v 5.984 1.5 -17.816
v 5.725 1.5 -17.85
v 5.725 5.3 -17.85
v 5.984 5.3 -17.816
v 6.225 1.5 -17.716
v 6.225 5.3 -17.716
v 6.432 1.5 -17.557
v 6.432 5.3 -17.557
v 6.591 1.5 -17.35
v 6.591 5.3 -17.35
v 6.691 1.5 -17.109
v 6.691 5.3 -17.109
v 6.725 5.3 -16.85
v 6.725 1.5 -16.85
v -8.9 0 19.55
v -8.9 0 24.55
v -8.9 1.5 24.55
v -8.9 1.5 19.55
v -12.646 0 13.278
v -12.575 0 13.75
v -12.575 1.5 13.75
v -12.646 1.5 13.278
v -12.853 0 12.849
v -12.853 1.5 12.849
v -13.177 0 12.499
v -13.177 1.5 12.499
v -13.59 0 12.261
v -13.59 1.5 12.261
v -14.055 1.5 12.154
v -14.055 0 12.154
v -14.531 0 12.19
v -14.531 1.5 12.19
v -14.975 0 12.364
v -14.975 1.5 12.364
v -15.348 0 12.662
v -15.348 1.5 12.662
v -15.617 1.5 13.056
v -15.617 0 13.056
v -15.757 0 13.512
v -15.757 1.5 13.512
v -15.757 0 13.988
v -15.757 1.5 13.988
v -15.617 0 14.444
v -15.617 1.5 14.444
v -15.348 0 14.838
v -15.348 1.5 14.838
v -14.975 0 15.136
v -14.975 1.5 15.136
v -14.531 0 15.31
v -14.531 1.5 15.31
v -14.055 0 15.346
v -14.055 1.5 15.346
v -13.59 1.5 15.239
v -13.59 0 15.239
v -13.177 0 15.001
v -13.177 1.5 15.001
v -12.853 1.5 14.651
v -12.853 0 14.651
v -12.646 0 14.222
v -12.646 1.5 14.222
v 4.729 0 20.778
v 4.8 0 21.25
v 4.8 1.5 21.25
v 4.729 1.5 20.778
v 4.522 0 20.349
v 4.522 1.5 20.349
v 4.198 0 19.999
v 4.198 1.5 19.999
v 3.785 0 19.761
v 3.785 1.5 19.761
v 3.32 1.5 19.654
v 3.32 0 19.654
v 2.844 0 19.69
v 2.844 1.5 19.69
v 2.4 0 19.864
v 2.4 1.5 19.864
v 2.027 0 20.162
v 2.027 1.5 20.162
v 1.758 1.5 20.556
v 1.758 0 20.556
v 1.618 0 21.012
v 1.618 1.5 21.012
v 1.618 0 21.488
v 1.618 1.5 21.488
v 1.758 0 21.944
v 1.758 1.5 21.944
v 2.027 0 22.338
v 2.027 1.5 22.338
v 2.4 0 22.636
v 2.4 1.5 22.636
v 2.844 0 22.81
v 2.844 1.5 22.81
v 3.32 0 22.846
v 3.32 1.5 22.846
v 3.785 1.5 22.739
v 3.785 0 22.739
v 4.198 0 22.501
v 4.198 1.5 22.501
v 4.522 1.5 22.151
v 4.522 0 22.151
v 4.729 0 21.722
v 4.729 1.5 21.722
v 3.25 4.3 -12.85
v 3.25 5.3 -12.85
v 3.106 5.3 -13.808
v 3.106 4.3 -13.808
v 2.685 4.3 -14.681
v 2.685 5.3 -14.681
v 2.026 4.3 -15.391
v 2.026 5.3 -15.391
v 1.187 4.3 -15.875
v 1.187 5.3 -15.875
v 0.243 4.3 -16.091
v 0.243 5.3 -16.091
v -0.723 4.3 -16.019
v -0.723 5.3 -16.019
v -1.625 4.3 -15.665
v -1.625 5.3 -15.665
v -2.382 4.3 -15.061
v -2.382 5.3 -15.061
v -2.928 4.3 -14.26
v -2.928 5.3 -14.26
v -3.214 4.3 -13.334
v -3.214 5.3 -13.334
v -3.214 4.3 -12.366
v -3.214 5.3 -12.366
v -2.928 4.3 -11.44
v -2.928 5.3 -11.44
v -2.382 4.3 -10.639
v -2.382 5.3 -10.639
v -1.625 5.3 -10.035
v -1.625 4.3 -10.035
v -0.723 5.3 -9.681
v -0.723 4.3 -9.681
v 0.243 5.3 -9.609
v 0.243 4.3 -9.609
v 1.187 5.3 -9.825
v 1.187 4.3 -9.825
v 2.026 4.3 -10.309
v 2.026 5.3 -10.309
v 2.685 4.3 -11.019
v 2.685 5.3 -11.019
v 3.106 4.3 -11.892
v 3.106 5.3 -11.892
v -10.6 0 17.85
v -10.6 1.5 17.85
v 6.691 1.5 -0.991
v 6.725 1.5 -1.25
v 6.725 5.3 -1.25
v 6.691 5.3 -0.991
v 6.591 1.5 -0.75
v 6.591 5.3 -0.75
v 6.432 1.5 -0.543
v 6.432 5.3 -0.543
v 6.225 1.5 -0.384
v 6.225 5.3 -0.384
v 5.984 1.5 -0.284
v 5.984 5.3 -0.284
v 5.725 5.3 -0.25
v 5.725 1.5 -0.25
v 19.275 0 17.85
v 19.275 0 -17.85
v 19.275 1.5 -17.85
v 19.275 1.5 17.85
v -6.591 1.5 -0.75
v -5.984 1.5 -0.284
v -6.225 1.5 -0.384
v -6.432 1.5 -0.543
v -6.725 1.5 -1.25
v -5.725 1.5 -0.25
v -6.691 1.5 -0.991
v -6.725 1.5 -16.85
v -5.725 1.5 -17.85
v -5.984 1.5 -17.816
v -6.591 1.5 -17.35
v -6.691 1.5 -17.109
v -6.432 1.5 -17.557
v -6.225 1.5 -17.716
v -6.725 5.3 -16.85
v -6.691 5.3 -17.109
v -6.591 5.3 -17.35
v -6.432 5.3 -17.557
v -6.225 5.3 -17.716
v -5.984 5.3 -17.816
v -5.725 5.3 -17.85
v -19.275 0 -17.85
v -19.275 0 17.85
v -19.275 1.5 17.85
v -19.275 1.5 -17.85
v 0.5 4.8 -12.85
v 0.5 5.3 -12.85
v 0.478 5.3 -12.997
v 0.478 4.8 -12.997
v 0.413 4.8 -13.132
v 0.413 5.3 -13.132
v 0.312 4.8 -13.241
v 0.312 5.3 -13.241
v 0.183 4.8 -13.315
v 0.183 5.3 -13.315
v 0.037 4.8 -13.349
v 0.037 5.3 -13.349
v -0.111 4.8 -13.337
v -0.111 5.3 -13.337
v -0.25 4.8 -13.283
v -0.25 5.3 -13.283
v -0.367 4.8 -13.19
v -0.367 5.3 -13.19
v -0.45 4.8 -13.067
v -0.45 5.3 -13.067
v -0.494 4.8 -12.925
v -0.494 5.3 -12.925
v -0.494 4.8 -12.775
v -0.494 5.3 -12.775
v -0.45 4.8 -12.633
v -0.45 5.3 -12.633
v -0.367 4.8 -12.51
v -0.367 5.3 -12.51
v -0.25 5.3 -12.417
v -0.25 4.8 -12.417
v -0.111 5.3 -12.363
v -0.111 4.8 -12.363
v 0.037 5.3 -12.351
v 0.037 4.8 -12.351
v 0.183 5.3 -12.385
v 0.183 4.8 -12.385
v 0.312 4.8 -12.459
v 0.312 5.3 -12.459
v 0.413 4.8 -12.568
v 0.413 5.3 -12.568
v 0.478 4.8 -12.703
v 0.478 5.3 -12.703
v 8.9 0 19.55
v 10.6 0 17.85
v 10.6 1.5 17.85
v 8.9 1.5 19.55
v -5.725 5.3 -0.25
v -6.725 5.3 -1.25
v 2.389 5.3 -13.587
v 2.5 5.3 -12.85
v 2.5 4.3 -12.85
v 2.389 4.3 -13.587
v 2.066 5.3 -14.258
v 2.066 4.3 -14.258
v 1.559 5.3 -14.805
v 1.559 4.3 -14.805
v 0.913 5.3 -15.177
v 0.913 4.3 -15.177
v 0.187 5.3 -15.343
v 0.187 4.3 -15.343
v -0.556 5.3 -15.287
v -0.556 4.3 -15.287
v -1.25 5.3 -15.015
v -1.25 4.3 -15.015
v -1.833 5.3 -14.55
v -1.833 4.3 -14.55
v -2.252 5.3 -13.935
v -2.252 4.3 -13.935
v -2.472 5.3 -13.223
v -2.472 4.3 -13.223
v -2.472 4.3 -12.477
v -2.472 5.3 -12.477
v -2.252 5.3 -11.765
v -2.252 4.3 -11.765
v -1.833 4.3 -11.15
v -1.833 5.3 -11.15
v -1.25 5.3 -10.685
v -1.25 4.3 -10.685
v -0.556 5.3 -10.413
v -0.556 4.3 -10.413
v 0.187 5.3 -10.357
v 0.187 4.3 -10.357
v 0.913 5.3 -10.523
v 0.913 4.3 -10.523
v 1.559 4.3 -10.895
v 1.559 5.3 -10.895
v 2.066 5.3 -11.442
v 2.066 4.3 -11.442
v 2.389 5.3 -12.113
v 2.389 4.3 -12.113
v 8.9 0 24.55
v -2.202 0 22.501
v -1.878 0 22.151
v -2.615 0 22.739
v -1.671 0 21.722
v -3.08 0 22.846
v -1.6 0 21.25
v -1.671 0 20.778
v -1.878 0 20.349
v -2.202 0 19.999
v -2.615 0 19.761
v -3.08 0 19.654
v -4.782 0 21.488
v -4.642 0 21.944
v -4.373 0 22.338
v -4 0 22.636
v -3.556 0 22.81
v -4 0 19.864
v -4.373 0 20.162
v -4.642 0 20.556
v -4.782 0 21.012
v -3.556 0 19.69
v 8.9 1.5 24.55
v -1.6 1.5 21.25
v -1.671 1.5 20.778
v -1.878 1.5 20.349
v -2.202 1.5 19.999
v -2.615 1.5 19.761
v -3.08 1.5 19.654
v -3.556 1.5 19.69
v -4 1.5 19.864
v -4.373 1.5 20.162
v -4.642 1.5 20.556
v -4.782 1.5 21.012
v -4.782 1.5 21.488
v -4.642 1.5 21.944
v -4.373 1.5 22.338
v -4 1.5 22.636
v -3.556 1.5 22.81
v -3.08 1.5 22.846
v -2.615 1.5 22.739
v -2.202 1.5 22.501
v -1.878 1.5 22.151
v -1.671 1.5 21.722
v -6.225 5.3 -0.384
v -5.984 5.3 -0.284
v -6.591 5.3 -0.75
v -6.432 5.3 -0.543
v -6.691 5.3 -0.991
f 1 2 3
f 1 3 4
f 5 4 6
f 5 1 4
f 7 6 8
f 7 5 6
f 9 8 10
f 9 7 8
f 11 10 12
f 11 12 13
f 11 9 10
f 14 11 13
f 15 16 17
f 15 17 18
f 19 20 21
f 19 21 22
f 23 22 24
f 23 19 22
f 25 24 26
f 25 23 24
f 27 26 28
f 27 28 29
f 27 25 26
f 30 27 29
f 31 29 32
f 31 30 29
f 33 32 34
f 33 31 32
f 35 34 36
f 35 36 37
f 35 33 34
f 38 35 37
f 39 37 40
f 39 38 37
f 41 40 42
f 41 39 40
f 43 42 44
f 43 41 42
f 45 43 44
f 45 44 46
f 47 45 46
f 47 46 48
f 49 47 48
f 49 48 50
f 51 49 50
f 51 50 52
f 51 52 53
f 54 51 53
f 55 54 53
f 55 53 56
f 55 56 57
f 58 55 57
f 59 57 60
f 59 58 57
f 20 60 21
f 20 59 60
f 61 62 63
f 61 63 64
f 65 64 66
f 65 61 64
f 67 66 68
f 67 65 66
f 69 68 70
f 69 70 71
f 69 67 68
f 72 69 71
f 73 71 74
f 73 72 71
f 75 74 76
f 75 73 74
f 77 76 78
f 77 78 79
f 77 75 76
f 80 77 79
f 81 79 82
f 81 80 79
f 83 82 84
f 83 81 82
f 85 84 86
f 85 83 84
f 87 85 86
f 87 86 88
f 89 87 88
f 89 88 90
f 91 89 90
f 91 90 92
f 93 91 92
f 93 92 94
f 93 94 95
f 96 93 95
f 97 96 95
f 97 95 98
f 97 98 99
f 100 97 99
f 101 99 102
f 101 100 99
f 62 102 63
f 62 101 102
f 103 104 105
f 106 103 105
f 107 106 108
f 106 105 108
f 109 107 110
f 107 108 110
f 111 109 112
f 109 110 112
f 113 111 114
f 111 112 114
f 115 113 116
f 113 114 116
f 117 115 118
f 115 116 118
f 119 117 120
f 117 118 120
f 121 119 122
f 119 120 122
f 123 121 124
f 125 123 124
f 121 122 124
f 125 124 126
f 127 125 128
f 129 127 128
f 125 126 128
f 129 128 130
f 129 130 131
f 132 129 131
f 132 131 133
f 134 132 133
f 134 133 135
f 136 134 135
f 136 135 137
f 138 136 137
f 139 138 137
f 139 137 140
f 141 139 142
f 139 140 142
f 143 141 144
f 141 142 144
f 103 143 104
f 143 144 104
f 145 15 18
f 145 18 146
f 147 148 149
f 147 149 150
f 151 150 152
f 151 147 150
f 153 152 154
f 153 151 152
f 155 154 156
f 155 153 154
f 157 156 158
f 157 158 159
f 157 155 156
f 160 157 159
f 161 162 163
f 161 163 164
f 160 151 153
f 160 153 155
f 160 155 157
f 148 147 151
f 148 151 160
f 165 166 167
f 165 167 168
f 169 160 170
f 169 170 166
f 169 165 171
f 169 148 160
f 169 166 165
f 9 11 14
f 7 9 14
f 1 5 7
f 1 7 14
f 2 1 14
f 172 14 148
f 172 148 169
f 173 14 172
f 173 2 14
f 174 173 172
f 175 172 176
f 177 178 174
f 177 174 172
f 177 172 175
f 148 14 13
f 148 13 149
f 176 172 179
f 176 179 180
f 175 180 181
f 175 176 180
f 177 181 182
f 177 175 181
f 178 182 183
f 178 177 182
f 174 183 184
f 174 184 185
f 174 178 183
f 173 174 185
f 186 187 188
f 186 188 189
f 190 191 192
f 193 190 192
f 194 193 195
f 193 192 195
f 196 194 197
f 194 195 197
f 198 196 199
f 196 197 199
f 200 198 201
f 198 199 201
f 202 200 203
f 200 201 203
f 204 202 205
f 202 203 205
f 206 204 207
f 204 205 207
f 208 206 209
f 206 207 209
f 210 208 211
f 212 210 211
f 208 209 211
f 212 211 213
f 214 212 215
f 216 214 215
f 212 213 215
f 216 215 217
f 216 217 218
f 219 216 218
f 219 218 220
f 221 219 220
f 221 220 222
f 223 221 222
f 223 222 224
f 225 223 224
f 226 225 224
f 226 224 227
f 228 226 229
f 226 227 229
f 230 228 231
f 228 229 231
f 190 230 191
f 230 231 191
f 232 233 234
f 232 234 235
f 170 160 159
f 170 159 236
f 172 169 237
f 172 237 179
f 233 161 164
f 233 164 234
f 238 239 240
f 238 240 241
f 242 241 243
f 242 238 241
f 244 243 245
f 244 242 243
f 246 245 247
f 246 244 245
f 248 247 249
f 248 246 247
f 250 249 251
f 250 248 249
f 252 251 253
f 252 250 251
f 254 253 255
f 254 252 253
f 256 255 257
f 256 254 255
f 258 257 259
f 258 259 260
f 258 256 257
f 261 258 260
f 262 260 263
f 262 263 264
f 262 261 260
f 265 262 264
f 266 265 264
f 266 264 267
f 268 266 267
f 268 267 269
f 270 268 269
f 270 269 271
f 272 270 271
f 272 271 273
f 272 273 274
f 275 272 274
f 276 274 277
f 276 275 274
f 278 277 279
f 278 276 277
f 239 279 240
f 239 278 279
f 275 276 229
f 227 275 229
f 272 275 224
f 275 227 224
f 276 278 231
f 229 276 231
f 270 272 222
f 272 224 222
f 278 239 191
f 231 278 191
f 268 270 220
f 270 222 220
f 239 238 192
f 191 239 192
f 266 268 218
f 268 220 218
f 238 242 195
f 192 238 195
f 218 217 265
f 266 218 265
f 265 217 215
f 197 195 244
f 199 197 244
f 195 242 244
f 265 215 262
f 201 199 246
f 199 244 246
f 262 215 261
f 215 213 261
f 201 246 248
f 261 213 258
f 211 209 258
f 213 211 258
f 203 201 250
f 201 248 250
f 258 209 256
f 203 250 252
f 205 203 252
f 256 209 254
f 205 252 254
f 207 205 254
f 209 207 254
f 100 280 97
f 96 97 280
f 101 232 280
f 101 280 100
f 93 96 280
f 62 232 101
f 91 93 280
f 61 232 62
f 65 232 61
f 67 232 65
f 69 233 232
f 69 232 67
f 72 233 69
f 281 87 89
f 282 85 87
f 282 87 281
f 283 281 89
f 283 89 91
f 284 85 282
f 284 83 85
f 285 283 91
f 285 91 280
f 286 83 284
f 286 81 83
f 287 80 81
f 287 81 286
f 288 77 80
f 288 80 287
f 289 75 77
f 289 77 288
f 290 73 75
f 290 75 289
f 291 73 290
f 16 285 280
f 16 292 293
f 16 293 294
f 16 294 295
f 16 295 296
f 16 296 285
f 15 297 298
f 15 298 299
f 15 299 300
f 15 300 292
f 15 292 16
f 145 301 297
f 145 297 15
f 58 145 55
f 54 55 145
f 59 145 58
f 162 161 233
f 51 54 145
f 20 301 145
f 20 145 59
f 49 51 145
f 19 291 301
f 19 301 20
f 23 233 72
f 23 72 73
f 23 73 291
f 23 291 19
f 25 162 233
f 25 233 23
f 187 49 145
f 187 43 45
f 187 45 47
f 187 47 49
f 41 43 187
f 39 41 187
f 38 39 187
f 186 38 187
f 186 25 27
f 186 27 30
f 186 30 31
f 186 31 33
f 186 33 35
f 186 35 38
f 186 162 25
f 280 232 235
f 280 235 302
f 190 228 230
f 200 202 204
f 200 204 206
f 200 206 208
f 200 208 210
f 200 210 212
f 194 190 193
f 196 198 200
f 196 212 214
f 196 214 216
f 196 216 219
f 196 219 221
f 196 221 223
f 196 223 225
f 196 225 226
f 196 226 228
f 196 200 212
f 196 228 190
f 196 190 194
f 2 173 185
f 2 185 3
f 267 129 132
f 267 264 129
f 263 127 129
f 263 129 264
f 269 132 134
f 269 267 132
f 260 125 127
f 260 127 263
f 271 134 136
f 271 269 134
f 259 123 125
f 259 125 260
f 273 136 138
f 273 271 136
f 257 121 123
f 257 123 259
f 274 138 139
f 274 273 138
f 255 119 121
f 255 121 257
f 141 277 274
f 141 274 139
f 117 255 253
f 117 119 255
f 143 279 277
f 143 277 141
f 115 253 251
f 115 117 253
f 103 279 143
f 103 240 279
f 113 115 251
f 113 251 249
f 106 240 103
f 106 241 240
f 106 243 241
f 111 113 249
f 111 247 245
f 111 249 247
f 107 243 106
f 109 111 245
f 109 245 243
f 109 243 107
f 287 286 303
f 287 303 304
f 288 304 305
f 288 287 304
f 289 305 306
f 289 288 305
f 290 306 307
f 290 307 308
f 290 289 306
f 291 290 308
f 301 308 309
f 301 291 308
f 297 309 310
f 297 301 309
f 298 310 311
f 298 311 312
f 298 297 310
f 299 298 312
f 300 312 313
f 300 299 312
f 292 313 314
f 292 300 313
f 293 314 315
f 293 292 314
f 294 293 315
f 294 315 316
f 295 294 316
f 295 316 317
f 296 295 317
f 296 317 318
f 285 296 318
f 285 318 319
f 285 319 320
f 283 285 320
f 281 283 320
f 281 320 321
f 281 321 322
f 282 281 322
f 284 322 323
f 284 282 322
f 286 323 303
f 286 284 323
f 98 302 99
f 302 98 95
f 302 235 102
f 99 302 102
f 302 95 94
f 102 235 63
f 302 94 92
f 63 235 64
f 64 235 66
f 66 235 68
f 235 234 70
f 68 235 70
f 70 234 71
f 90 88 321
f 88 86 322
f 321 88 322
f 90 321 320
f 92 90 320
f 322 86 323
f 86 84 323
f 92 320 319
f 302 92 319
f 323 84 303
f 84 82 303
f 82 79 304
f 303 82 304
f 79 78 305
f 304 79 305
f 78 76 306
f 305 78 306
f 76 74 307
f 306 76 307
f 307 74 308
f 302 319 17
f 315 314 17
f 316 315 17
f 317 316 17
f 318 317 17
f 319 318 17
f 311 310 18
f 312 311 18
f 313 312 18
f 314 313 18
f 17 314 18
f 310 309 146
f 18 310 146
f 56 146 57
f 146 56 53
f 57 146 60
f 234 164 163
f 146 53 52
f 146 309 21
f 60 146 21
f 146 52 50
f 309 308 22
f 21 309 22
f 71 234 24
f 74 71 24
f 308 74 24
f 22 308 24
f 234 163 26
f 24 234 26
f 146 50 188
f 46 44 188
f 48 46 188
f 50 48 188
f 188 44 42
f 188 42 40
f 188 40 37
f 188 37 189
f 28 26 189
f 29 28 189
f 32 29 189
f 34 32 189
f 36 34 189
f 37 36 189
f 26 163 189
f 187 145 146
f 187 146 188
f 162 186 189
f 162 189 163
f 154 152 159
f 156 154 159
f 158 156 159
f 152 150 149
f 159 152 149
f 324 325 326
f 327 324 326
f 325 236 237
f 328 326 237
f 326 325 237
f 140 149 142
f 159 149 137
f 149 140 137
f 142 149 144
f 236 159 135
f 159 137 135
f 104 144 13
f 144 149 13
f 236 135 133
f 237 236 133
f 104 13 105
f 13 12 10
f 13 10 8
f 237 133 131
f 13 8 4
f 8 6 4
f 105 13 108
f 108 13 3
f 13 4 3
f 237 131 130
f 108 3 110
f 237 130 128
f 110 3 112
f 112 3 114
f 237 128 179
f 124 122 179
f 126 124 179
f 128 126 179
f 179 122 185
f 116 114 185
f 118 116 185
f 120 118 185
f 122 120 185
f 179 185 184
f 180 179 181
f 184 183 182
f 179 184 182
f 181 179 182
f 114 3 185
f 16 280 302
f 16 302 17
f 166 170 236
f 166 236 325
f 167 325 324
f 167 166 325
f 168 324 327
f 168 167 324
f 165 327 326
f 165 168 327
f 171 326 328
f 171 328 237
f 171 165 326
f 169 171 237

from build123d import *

# Parameters (mm, degrees)
SKETCH_1_R          = 1.6
EXTRUDE_1_DEPTH     = 1.5
EXTRUDE_START       = 1.5
EXTRUDE_2_DEPTH     = 3.8
CUT_EXTRUDE_START   = 5.3
SKETCH_1_4_R        = 3.25
SKETCH_1_4_R_2      = 2.5
CUT_EXTRUDE_1_DEPTH = 1
SKETCH_2_R          = 0.5
CUT_EXTRUDE_2_DEPTH = 0.5


with BuildPart() as part:
    # Sketch 1 → Extrude 1 (new body)
    with BuildSketch(Plane(origin=(0, 0, 0), x_dir=(1, 0, 0), z_dir=(0, 1, 0))):
        Polygon((-19.275, 17.85), (19.275, 17.85), (19.275, -17.85), (10.6, -17.85), (8.9, -19.55), (8.9, -24.55), (-8.9, -24.55), (-8.9, -19.55), (-10.6, -17.85), (-19.275, -17.85), align=None)
        with Locations((-14.175, -13.75)):
            Circle(SKETCH_1_R, mode=Mode.SUBTRACT)
        with Locations((-3.2, -21.25)):
            Circle(SKETCH_1_R, mode=Mode.SUBTRACT)
        with Locations((3.2, -21.25)):
            Circle(SKETCH_1_R, mode=Mode.SUBTRACT)
    extrude(amount=EXTRUDE_1_DEPTH)


with BuildPart() as body_2:
    # Sketch 1_3 → Extrude 2 (new body)
    with BuildSketch(Plane(origin=(0, 0, 0), x_dir=(1, 0, 0), z_dir=(0, 1, 0)).offset(EXTRUDE_START)):
        with BuildLine():
            Line((5.725, 0.25), (-5.725, 0.25))
            ThreePointArc((-5.725, 0.25), (-6.432106781, 0.542893219), (-6.725, 1.25))
            Line((-6.725, 1.25), (-6.725, 16.85))
            ThreePointArc((-6.725, 16.85), (-6.432106781, 17.557106781), (-5.725, 17.85))
            Line((-5.725, 17.85), (5.725, 17.85))
            ThreePointArc((5.725, 17.85), (6.432106781, 17.557106781), (6.725, 16.85))
            Line((6.725, 16.85), (6.725, 1.25))
            ThreePointArc((6.725, 1.25), (6.432106781, 0.542893219), (5.725, 0.25))
        make_face()
    extrude(amount=EXTRUDE_2_DEPTH)

    # Sketch 1_4 → Cut-Extrude 1 (cut)
    with BuildSketch(Plane(origin=(0, 0, 0), x_dir=(1, 0, 0), z_dir=(0, 1, 0)).offset(CUT_EXTRUDE_START)):
        with Locations((0, 12.85)):
            Circle(SKETCH_1_4_R)
        with Locations((0, 12.85)):
            Circle(SKETCH_1_4_R_2, mode=Mode.SUBTRACT)
    extrude(amount=-CUT_EXTRUDE_1_DEPTH, mode=Mode.SUBTRACT)

    # Sketch 2 → Cut-Extrude 2 (cut)
    with BuildSketch(Plane(origin=(0, 5.3, 0), x_dir=(1, 0, 0), z_dir=(0, 1, 0))):
        with Locations((0, 12.85)):
            Circle(SKETCH_2_R)
    extrude(amount=-CUT_EXTRUDE_2_DEPTH, mode=Mode.SUBTRACT)


solid = Compound([part.part, body_2.part])
